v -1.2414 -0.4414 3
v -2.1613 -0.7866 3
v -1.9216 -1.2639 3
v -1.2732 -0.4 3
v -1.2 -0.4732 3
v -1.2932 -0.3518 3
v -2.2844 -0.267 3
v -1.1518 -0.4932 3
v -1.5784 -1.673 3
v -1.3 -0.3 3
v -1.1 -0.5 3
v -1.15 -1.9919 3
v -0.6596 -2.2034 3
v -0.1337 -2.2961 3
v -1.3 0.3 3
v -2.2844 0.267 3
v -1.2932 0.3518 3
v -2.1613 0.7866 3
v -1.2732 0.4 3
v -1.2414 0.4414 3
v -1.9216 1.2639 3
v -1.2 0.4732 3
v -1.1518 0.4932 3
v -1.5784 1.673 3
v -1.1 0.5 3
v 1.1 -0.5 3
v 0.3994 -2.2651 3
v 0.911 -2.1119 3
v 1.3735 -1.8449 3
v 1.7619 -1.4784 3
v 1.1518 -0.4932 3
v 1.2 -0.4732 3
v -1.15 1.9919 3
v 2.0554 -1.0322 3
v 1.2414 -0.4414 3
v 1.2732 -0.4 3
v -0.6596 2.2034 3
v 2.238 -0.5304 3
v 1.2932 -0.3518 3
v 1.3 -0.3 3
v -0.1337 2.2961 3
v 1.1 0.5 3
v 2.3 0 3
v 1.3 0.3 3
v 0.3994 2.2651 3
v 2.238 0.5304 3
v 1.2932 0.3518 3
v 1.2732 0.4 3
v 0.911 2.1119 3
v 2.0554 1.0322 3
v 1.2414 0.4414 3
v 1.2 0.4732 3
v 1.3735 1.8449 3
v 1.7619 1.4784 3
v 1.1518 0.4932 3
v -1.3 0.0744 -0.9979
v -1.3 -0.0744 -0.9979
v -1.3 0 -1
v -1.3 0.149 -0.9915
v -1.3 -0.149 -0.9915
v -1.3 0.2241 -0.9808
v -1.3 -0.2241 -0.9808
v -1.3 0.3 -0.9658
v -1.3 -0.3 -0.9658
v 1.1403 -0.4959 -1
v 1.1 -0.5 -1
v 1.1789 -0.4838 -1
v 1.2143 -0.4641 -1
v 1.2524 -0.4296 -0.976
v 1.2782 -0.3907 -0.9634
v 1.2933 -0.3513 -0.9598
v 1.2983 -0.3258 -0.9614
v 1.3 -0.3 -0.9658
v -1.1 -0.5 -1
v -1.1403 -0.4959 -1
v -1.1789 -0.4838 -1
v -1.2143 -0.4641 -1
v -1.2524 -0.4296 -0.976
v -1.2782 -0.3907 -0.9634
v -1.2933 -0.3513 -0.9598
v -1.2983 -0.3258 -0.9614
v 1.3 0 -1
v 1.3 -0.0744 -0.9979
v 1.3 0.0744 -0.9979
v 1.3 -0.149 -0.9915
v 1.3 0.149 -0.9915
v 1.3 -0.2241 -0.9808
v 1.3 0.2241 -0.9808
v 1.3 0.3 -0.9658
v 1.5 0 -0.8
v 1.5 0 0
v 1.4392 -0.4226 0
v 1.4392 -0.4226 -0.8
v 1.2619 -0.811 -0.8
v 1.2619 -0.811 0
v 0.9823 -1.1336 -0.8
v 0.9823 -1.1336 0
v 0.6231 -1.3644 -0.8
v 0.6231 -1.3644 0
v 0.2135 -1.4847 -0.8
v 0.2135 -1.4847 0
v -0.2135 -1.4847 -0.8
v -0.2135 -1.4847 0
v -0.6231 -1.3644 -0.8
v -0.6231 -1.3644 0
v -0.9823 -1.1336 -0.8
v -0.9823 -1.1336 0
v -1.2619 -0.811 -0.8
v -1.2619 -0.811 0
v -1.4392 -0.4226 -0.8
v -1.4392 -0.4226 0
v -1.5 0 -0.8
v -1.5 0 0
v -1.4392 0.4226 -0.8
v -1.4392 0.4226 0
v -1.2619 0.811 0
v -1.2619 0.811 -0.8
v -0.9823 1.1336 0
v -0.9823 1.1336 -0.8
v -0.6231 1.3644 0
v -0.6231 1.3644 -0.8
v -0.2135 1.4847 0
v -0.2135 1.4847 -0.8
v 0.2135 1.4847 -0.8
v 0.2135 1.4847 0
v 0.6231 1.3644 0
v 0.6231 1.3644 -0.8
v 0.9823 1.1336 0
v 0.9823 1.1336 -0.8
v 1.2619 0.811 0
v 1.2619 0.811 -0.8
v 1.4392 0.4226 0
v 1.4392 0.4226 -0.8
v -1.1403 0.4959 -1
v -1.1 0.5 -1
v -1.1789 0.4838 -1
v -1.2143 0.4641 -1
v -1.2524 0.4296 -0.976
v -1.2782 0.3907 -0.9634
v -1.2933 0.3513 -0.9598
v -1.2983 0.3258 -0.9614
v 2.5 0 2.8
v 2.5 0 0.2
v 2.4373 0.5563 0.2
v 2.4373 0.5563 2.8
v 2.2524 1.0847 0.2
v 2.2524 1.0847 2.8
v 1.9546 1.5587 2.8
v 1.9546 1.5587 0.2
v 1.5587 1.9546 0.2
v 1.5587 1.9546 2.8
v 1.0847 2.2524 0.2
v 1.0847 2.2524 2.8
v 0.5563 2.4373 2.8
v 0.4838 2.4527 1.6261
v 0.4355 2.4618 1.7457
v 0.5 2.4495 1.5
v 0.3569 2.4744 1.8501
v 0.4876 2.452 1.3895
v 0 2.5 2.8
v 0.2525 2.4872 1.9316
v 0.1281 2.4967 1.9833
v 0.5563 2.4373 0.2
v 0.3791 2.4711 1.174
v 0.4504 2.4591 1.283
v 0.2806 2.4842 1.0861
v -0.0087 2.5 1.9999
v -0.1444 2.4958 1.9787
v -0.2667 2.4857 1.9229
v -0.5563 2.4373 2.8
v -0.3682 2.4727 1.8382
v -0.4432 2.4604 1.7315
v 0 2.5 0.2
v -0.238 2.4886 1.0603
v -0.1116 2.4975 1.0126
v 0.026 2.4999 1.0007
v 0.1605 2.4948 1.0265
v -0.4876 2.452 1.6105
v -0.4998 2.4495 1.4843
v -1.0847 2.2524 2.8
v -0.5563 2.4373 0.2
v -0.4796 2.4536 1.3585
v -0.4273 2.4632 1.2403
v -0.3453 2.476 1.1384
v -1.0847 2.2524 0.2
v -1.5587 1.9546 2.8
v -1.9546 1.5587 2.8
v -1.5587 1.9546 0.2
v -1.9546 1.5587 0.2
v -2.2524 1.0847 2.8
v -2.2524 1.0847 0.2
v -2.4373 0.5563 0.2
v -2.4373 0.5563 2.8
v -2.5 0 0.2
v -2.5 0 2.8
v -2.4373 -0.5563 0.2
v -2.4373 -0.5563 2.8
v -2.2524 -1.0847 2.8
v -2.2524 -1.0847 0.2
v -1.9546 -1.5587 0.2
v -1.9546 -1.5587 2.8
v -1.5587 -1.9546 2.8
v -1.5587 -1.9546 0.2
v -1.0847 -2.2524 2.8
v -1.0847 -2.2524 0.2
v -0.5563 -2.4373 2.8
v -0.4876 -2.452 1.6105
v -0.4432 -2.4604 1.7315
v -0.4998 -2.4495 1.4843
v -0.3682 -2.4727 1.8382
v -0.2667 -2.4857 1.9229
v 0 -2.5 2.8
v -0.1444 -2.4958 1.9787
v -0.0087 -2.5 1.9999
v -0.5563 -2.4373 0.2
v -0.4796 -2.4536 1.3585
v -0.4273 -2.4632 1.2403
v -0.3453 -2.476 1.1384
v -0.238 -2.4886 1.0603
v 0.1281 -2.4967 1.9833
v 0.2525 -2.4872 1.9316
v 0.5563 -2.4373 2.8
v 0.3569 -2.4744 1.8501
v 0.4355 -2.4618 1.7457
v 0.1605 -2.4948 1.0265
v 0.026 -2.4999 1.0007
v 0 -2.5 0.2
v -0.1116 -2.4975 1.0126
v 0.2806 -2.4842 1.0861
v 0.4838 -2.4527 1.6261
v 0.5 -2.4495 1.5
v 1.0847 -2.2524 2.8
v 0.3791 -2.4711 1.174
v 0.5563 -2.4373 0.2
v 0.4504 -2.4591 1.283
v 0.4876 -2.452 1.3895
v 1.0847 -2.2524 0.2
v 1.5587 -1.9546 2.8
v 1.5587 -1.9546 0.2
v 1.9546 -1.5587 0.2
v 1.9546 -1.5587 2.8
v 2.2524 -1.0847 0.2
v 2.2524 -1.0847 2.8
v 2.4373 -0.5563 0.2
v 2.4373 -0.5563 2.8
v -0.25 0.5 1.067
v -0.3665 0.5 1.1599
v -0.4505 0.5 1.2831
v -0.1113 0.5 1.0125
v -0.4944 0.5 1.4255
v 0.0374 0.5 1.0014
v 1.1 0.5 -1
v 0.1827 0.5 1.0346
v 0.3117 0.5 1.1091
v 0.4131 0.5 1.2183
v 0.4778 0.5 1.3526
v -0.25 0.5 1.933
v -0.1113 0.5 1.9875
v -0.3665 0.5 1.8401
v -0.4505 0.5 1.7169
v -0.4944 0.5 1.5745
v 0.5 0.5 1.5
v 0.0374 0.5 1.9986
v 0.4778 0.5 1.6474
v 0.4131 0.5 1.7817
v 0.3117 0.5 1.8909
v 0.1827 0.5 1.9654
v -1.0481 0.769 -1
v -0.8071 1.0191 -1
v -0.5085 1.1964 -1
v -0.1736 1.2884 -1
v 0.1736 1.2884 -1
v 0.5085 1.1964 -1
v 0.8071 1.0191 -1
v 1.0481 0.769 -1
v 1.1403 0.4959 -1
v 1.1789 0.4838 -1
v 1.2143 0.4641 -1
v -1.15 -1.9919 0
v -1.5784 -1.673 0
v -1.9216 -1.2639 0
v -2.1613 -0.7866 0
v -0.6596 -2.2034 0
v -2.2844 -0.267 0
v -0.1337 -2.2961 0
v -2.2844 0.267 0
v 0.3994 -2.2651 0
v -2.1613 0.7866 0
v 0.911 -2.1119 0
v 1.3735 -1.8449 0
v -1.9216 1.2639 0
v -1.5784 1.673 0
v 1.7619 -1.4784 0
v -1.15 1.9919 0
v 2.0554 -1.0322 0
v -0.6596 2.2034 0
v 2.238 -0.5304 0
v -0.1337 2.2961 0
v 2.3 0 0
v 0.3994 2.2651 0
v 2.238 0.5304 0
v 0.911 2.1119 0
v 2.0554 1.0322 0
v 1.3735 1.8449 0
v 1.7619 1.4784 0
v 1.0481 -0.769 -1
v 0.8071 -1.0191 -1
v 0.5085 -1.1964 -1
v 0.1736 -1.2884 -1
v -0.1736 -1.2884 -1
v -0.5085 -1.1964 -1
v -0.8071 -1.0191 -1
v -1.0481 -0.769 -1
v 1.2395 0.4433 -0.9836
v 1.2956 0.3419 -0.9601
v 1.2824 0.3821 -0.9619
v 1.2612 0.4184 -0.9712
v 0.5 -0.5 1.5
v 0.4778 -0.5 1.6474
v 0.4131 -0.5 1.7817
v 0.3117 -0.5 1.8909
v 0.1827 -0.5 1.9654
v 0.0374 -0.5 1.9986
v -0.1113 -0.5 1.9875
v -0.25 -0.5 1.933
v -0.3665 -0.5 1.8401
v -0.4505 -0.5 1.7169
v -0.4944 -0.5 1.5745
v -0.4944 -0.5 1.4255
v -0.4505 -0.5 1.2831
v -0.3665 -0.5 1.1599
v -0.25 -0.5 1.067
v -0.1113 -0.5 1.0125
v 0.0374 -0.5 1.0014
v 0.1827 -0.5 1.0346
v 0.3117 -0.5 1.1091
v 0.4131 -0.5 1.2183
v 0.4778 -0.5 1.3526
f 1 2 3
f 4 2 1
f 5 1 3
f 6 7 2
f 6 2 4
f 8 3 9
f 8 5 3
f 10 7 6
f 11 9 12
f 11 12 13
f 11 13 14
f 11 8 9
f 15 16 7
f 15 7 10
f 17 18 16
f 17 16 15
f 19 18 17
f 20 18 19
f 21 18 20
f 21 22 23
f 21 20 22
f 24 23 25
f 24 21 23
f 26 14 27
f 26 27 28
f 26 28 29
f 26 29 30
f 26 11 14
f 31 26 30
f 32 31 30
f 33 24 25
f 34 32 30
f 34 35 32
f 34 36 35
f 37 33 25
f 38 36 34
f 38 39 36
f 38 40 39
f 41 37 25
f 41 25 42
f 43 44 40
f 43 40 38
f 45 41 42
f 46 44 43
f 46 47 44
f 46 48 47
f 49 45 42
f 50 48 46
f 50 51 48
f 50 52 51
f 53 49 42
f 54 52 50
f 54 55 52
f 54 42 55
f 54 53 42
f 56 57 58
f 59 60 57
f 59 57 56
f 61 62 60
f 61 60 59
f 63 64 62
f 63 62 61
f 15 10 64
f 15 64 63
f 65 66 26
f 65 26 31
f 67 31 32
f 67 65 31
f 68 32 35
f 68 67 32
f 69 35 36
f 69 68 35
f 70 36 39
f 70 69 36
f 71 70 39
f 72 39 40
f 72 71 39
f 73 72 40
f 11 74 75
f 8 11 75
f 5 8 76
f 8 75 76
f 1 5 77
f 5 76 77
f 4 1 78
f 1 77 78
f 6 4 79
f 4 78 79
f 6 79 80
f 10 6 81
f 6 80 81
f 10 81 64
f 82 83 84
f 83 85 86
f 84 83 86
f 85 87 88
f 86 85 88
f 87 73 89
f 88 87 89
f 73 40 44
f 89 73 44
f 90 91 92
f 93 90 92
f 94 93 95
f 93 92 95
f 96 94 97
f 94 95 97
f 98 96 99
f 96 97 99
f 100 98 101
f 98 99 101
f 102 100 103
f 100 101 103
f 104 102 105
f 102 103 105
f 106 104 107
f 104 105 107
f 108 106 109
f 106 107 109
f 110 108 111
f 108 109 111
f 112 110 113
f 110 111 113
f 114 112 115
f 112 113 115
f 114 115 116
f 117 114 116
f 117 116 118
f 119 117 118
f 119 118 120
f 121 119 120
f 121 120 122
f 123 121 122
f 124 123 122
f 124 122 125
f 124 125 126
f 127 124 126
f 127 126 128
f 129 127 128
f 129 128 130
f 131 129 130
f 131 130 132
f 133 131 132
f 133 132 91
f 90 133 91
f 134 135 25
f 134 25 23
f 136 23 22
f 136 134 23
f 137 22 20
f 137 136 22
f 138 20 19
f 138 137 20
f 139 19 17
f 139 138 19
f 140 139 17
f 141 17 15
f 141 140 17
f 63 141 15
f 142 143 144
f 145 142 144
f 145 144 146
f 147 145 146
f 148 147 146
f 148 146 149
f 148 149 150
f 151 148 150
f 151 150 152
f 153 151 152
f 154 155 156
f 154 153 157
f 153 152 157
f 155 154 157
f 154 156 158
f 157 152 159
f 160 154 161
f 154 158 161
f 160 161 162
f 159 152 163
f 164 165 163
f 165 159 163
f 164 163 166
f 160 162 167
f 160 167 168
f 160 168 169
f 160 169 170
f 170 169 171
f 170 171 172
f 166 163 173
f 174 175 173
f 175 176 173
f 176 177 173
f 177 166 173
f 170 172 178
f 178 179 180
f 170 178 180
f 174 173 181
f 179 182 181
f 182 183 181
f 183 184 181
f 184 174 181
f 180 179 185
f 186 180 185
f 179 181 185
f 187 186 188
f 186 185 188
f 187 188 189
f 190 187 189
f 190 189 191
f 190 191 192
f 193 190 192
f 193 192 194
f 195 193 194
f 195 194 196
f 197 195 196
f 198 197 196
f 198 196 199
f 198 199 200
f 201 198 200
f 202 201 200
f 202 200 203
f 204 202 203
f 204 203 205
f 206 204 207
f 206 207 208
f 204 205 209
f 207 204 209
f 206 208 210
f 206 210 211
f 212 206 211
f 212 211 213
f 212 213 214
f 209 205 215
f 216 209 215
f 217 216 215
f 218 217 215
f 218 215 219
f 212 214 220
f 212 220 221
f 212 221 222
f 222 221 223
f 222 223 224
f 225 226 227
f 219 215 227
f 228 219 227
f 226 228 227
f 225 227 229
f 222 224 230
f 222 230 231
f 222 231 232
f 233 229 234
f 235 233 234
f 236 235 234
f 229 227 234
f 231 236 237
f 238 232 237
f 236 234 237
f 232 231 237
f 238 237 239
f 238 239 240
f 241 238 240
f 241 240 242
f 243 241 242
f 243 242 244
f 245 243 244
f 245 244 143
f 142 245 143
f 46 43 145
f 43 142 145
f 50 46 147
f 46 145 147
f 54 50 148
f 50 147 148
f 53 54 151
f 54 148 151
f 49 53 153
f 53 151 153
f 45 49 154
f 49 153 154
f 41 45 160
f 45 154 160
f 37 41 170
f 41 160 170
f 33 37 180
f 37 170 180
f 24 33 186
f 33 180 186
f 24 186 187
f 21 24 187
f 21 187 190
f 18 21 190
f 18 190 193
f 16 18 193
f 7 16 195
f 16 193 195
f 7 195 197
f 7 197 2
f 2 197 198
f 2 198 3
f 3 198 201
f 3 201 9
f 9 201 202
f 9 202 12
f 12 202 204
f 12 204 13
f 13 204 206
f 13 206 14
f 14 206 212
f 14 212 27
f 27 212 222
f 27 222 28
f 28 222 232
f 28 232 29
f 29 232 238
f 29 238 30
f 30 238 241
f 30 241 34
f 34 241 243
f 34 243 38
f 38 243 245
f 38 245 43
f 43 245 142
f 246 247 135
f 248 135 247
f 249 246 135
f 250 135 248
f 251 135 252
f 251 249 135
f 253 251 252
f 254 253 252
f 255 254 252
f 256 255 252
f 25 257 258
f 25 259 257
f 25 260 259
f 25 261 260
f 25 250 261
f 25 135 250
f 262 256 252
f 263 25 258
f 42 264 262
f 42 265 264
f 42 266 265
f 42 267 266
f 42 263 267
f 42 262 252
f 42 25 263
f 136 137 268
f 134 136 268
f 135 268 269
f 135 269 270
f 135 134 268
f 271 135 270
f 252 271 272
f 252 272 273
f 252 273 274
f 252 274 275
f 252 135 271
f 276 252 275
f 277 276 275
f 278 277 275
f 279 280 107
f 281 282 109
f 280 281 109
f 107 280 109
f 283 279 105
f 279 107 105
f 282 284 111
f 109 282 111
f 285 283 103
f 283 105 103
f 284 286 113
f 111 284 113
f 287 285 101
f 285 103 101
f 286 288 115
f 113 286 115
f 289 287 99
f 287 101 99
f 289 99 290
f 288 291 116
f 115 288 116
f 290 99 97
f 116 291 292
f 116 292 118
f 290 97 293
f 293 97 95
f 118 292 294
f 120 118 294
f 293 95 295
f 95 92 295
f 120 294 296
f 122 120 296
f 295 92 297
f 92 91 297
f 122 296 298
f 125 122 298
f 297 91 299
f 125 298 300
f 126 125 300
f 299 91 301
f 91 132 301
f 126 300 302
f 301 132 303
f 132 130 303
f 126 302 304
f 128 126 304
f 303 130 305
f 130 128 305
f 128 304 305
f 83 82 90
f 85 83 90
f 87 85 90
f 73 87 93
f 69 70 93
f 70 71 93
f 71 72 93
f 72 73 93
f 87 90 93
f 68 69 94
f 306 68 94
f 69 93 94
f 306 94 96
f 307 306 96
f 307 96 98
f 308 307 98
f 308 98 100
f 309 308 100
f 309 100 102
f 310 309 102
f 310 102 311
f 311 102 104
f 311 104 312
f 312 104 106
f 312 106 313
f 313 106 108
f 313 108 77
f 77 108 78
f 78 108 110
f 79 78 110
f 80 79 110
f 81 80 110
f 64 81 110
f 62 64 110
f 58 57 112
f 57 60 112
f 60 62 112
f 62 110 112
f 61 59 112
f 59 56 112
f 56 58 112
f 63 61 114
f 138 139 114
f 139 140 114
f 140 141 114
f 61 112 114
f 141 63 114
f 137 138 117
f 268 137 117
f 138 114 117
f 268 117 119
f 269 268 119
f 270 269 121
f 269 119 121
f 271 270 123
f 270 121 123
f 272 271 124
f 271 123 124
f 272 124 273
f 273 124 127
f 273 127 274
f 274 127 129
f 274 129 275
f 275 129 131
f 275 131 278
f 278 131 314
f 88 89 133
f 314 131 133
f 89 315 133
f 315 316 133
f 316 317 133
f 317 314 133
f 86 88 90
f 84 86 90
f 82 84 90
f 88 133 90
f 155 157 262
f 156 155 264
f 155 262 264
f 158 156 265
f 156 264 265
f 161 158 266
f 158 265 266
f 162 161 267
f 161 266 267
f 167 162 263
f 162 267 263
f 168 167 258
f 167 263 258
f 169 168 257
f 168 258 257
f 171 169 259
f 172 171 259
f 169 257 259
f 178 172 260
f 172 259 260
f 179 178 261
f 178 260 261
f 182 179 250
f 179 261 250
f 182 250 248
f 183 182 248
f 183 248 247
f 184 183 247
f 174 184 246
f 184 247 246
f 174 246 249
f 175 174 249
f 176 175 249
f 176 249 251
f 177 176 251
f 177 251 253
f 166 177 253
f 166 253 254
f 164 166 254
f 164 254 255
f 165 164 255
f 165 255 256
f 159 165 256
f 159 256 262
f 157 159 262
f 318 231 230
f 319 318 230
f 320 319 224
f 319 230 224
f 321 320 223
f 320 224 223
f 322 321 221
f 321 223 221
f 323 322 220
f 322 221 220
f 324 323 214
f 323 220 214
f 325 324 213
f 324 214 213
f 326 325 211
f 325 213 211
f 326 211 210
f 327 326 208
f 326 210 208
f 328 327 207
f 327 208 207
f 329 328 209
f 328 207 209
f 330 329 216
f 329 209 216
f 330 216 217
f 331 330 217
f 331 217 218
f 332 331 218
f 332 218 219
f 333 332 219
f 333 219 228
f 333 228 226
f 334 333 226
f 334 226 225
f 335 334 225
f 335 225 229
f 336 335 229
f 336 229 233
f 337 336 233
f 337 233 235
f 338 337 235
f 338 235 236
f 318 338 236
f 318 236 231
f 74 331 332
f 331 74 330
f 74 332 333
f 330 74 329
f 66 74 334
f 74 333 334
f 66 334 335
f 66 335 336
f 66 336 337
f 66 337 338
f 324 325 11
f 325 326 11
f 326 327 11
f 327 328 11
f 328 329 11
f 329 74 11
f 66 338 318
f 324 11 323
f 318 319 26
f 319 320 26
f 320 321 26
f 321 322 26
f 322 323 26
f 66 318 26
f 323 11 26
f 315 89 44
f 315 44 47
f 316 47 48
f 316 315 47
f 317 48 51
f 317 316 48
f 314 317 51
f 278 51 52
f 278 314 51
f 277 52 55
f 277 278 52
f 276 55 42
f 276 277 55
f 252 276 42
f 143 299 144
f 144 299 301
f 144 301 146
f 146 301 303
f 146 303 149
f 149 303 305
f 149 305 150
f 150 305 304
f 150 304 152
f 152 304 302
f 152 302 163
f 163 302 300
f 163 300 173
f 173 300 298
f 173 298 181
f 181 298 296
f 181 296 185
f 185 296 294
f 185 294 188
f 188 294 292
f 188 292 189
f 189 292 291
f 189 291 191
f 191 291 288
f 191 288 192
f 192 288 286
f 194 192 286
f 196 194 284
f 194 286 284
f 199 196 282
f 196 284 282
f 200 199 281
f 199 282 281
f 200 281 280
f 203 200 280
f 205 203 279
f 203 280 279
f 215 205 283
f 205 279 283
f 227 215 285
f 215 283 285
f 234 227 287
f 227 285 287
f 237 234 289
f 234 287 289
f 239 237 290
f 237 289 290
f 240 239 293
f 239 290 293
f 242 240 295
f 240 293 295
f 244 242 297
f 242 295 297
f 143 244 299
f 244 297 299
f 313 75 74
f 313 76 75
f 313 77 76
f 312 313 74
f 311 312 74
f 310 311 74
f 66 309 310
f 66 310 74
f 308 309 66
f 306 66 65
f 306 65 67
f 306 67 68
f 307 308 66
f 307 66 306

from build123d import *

# Parameters (mm, degrees)
F0_R     = 2.5
F1_DEPTH = 3
F2_R     = 1.5
F3_DEPTH = 1
F5_R     = 0.5
F6_DEPTH = 7.501
F7_W     = 2.6
F7_H     = 1
F8_DEPTH = 4.001
F9_R     = 0.2


# Not quite as in the source:
# - a fillet or chamfer that OpenCascade refuses, or shapes differently, is made with other operations: its cross-section is extruded or revolved along the edge and cut away or added


with BuildPart() as f1:
    # F0 (on Top) → F1 (new body)
    with BuildSketch(Plane.XY):
        Circle(F0_R)
    extrude(amount=F1_DEPTH)

    # F2 (on face) → F3 (join)
    with BuildSketch(Plane(origin=(0, 0, 0), x_dir=(1, 0, 0), z_dir=(0, 0, -1))):
        Circle(F2_R)
    extrude(amount=F3_DEPTH)

    # F5 (on offset) → F6 (cut, through all)
    with BuildSketch(Plane.XZ.offset(5)):
        with Locations((0, 1.5)):
            Circle(F5_R)
    extrude(amount=-F6_DEPTH, mode=Mode.SUBTRACT)

    # F7 (on face) → F8 (cut, through all)
    with BuildSketch(Plane.XY.offset(3)):
        Rectangle(F7_W, F7_H)
    extrude(amount=-F8_DEPTH, mode=Mode.SUBTRACT)

    # F9
    f9_edges = [f1.edges().sort_by_distance(p)[0] for p in [
        (-1.3, 0.5, 1),
        (-1.3, -0.5, 1),
        (1.3, -0.5, 1),
        (1.3, 0.5, 1),
    ]]
    fillet(f9_edges, radius=F9_R)

    # F10: chamfer of 0.2 on 3 edges, made by hand

    # F10_s1 → F10_t2 (revolve, cut)
    with BuildSketch(Plane.XZ):
        Polygon((2.3, 3), (2.5, 2.8), (2.5, 3), align=None)
    revolve(axis=Axis((0, 0, 3), (0, 0, 1)), mode=Mode.SUBTRACT)

    # F10_s3 → F10_t4 (revolve, cut)
    with BuildSketch(Plane.XZ):
        Polygon((2.5, 0.2), (2.3, 0), (2.5, 0), align=None)
    revolve(axis=Axis((0, 0, 0), (0, 0, 1)), mode=Mode.SUBTRACT)

    # F10_s5 → F10_t6 (revolve, cut)
    with BuildSketch(Plane.XZ):
        Polygon((1.3, -1), (1.5, -0.8), (1.5, -1), align=None)
    revolve(axis=Axis((0, 0, -1), (0, 0, -1)), mode=Mode.SUBTRACT)


solid = f1.part
